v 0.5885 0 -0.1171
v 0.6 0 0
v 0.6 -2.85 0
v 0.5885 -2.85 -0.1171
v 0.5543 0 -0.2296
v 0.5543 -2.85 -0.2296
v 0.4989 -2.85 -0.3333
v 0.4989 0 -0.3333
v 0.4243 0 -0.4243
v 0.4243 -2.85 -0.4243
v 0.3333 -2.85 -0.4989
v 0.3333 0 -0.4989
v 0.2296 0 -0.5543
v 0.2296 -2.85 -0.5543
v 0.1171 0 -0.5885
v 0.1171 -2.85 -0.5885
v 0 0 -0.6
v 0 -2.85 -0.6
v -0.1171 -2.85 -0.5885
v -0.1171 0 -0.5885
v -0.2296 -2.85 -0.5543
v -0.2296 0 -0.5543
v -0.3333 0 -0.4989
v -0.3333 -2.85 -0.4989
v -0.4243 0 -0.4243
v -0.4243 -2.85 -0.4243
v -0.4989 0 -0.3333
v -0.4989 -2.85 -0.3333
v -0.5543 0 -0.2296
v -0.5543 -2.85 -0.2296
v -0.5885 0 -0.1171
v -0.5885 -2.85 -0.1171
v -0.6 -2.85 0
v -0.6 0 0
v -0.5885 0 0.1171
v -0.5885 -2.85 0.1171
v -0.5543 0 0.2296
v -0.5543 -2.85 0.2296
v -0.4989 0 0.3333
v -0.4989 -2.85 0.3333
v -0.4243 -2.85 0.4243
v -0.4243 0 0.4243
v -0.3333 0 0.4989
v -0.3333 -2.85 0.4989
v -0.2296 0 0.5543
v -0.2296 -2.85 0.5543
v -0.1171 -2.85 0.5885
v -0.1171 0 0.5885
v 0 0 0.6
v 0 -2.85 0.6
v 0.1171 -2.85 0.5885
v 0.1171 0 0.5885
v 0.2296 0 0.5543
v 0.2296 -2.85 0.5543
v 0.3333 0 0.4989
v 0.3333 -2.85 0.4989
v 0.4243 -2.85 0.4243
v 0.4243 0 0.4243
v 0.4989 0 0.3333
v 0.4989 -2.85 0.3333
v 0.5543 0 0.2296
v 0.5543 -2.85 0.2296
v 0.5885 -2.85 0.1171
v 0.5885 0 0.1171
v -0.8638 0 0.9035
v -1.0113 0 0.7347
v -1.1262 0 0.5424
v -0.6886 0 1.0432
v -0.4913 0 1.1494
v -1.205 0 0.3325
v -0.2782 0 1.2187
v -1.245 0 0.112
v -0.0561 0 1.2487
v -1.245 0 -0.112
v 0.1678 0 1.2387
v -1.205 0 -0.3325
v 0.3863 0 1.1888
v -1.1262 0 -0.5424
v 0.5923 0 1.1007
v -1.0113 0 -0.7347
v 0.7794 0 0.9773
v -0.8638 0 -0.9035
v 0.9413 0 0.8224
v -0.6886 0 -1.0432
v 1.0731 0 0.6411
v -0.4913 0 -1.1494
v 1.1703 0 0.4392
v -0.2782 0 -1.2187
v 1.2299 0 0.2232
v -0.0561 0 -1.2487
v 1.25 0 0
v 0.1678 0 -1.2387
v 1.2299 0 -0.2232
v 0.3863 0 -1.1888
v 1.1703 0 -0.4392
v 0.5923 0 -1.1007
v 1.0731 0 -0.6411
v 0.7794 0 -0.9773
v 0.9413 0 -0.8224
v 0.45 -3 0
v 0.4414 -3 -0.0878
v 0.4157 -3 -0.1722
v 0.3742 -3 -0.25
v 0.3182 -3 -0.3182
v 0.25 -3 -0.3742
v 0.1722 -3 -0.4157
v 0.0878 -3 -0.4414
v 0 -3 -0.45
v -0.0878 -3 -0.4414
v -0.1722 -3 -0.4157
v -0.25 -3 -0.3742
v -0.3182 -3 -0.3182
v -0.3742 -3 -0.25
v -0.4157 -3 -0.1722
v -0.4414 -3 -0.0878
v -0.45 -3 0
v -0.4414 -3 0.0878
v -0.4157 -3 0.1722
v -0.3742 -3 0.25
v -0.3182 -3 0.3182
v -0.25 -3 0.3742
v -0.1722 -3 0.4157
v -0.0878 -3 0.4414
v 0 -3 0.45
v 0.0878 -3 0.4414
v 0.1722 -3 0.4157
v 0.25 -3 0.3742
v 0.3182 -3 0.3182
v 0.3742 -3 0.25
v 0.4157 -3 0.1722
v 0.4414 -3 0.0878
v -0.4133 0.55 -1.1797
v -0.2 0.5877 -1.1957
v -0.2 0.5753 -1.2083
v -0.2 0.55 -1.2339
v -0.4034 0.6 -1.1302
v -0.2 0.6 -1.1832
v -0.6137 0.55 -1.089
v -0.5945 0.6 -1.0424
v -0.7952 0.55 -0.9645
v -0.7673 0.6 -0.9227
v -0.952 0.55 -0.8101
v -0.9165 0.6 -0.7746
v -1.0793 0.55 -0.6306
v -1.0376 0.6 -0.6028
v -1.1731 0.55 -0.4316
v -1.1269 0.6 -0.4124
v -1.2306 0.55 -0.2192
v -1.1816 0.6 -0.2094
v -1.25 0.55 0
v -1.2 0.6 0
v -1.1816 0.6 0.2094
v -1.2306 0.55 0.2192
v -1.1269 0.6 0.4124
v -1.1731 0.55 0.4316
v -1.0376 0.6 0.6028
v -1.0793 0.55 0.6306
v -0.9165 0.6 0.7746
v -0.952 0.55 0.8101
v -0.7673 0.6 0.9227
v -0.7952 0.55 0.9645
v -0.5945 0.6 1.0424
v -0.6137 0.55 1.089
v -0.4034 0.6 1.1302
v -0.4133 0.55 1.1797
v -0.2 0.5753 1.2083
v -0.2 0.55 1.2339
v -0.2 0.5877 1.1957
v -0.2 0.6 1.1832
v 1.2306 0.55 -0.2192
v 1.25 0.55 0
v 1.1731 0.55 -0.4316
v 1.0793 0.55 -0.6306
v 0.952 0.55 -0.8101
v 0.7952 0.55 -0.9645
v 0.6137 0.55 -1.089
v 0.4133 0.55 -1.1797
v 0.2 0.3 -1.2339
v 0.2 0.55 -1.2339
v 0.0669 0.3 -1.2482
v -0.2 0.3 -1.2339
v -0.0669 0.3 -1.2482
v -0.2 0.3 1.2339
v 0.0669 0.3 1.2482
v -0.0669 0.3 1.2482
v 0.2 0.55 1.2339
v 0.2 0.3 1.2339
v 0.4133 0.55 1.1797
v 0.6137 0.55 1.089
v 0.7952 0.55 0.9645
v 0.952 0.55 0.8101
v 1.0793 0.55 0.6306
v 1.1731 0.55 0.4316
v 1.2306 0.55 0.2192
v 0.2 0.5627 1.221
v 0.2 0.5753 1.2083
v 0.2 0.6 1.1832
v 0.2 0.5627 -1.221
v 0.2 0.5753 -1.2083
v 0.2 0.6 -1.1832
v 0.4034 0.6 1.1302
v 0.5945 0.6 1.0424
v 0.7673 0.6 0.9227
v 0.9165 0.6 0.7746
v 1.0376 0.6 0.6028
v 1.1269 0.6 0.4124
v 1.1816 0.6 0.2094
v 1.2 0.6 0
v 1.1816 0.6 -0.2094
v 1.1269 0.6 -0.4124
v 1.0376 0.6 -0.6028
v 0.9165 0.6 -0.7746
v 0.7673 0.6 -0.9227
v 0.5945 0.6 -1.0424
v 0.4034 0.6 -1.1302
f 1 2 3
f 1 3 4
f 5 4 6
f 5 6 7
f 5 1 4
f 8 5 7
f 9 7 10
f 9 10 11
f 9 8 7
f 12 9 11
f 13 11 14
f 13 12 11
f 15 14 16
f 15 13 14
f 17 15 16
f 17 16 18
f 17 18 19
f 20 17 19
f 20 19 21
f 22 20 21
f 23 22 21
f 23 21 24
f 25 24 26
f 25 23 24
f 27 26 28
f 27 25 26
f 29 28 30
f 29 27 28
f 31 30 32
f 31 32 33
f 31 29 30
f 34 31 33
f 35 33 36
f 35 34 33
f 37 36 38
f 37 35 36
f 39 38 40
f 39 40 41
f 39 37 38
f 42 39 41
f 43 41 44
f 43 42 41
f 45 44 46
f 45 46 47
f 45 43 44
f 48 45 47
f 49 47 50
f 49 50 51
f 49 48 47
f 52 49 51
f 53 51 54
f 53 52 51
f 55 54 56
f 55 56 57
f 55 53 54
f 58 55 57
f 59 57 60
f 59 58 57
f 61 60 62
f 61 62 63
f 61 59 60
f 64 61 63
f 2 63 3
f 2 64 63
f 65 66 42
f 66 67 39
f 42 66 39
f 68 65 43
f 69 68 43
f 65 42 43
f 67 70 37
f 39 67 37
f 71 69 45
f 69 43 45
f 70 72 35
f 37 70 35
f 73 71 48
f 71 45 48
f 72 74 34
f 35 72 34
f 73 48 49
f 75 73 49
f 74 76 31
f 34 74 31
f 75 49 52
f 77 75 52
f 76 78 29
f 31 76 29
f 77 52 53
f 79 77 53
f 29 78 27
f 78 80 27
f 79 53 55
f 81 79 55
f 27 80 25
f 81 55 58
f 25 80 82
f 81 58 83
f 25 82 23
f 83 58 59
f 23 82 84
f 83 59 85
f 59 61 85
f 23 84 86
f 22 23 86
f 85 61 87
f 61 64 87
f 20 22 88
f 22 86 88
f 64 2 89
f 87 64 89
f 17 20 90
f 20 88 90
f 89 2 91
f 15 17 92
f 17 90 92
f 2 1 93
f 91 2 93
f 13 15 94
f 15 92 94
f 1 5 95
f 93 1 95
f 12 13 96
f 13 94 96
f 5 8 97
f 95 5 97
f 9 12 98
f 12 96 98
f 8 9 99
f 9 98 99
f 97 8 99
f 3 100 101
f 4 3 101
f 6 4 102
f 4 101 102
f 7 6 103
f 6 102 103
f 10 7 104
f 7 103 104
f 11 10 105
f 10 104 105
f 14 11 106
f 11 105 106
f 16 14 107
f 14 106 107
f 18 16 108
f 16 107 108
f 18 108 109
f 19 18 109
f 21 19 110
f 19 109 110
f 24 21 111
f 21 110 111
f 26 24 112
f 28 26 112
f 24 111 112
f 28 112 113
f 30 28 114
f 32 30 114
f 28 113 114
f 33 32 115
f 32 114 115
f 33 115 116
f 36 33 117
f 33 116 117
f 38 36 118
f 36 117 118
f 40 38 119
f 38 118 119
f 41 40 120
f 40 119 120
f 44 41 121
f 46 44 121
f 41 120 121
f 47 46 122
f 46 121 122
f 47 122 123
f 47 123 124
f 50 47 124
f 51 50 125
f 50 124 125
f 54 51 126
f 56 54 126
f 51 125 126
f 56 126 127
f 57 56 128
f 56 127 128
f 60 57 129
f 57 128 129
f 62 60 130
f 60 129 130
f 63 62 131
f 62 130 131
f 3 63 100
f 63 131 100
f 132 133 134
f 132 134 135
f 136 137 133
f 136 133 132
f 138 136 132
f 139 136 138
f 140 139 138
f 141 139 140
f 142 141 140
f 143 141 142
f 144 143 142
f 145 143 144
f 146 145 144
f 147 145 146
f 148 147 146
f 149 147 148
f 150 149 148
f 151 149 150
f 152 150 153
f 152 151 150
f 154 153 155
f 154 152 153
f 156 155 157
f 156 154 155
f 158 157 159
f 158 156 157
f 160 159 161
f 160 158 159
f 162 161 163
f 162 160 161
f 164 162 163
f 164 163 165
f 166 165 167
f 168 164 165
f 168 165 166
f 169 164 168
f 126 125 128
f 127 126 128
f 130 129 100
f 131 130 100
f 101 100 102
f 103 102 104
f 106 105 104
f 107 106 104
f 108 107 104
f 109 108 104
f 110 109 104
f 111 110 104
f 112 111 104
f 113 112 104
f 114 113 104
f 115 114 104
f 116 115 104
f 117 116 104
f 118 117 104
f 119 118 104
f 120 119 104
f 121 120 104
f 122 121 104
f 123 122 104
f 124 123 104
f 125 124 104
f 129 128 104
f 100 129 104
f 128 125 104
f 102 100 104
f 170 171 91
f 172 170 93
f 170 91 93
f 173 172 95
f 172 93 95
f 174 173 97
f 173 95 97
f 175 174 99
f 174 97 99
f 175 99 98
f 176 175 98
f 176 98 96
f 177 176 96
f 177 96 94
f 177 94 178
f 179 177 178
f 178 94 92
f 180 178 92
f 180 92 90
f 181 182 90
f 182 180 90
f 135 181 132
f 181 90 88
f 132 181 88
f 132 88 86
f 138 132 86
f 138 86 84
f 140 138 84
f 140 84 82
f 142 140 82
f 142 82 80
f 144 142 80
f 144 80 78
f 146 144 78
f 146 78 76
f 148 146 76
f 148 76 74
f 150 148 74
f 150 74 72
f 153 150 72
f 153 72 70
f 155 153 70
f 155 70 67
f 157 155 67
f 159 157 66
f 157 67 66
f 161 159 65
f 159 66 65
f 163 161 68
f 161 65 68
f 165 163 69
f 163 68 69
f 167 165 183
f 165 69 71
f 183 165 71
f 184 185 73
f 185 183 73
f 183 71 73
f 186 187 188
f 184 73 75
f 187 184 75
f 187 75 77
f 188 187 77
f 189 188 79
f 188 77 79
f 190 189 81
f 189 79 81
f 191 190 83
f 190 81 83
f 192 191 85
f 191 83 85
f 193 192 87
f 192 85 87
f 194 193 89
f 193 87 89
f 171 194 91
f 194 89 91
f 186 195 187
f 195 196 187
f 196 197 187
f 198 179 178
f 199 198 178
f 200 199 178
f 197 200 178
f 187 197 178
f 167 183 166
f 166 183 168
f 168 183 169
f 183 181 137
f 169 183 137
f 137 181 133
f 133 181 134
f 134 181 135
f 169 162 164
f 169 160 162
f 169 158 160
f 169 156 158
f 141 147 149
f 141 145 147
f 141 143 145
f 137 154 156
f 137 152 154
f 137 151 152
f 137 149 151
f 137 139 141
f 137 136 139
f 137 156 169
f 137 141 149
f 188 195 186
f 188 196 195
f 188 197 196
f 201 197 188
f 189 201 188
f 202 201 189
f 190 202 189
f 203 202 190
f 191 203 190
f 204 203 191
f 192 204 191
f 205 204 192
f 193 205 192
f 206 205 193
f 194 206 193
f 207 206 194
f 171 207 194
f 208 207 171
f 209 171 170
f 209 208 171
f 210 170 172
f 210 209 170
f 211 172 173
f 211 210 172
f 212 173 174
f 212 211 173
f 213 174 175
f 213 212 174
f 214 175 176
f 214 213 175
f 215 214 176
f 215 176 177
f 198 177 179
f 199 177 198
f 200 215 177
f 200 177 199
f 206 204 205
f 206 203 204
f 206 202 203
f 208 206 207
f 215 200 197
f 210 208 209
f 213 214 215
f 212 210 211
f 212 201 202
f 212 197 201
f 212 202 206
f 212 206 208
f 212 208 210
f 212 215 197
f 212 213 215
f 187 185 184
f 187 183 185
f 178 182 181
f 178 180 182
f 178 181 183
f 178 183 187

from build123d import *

# Parameters (mm, degrees)
SKETCH1_R               = 1.25
BOSS_EXTRUDE1_DEPTH     = 0.6
SKETCH2_R               = 0.6
BOSS_EXTRUDE2_DEPTH     = 3
CHAMFER1_SIZE           = 0.05
CHAMFER2_SIZE           = 0.15
CUT_EXTRUDE1_DEPTH      = 2.25
CUT_EXTRUDE1_DEPTH_BACK = 2.25


with BuildPart() as part:
    # Sketch1 → Boss-Extrude1 (new body)
    with BuildSketch(Plane(origin=(0, 0, 0), x_dir=(1, 0, 0), z_dir=(0, 1, 0))):
        Circle(SKETCH1_R)
    extrude(amount=BOSS_EXTRUDE1_DEPTH)

    # Sketch2 → Boss-Extrude2 (add)
    with BuildSketch(Plane(origin=(0, 0, 0), x_dir=(1, 0, 0), z_dir=(0, 1, 0))):
        Circle(SKETCH2_R)
    extrude(amount=-BOSS_EXTRUDE2_DEPTH)

    # Chamfer1
    chamfer1_edges = [part.edges().sort_by_distance(p)[0] for p in [
        (-1.25, 0.6, 0),
    ]]
    chamfer(chamfer1_edges, length=CHAMFER1_SIZE)

    # Chamfer2
    chamfer2_edges = [part.edges().sort_by_distance(p)[0] for p in [
        (-0.6, -3, 0),
    ]]
    chamfer(chamfer2_edges, length=CHAMFER2_SIZE)

    # Sketch3 → Cut-Extrude1 (cut, two sides)
    with BuildSketch(Plane.XY) as cut_extrude1_sk:
        Polygon((-0.2, 0.6), (0, 0.6), (0.2, 0.6), (0.2, 0.3), (0, 0.3), (-0.2, 0.3), align=None)
    extrude(amount=CUT_EXTRUDE1_DEPTH, mode=Mode.SUBTRACT)
    extrude(cut_extrude1_sk.sketch, amount=-CUT_EXTRUDE1_DEPTH_BACK, mode=Mode.SUBTRACT)


solid = part.part
